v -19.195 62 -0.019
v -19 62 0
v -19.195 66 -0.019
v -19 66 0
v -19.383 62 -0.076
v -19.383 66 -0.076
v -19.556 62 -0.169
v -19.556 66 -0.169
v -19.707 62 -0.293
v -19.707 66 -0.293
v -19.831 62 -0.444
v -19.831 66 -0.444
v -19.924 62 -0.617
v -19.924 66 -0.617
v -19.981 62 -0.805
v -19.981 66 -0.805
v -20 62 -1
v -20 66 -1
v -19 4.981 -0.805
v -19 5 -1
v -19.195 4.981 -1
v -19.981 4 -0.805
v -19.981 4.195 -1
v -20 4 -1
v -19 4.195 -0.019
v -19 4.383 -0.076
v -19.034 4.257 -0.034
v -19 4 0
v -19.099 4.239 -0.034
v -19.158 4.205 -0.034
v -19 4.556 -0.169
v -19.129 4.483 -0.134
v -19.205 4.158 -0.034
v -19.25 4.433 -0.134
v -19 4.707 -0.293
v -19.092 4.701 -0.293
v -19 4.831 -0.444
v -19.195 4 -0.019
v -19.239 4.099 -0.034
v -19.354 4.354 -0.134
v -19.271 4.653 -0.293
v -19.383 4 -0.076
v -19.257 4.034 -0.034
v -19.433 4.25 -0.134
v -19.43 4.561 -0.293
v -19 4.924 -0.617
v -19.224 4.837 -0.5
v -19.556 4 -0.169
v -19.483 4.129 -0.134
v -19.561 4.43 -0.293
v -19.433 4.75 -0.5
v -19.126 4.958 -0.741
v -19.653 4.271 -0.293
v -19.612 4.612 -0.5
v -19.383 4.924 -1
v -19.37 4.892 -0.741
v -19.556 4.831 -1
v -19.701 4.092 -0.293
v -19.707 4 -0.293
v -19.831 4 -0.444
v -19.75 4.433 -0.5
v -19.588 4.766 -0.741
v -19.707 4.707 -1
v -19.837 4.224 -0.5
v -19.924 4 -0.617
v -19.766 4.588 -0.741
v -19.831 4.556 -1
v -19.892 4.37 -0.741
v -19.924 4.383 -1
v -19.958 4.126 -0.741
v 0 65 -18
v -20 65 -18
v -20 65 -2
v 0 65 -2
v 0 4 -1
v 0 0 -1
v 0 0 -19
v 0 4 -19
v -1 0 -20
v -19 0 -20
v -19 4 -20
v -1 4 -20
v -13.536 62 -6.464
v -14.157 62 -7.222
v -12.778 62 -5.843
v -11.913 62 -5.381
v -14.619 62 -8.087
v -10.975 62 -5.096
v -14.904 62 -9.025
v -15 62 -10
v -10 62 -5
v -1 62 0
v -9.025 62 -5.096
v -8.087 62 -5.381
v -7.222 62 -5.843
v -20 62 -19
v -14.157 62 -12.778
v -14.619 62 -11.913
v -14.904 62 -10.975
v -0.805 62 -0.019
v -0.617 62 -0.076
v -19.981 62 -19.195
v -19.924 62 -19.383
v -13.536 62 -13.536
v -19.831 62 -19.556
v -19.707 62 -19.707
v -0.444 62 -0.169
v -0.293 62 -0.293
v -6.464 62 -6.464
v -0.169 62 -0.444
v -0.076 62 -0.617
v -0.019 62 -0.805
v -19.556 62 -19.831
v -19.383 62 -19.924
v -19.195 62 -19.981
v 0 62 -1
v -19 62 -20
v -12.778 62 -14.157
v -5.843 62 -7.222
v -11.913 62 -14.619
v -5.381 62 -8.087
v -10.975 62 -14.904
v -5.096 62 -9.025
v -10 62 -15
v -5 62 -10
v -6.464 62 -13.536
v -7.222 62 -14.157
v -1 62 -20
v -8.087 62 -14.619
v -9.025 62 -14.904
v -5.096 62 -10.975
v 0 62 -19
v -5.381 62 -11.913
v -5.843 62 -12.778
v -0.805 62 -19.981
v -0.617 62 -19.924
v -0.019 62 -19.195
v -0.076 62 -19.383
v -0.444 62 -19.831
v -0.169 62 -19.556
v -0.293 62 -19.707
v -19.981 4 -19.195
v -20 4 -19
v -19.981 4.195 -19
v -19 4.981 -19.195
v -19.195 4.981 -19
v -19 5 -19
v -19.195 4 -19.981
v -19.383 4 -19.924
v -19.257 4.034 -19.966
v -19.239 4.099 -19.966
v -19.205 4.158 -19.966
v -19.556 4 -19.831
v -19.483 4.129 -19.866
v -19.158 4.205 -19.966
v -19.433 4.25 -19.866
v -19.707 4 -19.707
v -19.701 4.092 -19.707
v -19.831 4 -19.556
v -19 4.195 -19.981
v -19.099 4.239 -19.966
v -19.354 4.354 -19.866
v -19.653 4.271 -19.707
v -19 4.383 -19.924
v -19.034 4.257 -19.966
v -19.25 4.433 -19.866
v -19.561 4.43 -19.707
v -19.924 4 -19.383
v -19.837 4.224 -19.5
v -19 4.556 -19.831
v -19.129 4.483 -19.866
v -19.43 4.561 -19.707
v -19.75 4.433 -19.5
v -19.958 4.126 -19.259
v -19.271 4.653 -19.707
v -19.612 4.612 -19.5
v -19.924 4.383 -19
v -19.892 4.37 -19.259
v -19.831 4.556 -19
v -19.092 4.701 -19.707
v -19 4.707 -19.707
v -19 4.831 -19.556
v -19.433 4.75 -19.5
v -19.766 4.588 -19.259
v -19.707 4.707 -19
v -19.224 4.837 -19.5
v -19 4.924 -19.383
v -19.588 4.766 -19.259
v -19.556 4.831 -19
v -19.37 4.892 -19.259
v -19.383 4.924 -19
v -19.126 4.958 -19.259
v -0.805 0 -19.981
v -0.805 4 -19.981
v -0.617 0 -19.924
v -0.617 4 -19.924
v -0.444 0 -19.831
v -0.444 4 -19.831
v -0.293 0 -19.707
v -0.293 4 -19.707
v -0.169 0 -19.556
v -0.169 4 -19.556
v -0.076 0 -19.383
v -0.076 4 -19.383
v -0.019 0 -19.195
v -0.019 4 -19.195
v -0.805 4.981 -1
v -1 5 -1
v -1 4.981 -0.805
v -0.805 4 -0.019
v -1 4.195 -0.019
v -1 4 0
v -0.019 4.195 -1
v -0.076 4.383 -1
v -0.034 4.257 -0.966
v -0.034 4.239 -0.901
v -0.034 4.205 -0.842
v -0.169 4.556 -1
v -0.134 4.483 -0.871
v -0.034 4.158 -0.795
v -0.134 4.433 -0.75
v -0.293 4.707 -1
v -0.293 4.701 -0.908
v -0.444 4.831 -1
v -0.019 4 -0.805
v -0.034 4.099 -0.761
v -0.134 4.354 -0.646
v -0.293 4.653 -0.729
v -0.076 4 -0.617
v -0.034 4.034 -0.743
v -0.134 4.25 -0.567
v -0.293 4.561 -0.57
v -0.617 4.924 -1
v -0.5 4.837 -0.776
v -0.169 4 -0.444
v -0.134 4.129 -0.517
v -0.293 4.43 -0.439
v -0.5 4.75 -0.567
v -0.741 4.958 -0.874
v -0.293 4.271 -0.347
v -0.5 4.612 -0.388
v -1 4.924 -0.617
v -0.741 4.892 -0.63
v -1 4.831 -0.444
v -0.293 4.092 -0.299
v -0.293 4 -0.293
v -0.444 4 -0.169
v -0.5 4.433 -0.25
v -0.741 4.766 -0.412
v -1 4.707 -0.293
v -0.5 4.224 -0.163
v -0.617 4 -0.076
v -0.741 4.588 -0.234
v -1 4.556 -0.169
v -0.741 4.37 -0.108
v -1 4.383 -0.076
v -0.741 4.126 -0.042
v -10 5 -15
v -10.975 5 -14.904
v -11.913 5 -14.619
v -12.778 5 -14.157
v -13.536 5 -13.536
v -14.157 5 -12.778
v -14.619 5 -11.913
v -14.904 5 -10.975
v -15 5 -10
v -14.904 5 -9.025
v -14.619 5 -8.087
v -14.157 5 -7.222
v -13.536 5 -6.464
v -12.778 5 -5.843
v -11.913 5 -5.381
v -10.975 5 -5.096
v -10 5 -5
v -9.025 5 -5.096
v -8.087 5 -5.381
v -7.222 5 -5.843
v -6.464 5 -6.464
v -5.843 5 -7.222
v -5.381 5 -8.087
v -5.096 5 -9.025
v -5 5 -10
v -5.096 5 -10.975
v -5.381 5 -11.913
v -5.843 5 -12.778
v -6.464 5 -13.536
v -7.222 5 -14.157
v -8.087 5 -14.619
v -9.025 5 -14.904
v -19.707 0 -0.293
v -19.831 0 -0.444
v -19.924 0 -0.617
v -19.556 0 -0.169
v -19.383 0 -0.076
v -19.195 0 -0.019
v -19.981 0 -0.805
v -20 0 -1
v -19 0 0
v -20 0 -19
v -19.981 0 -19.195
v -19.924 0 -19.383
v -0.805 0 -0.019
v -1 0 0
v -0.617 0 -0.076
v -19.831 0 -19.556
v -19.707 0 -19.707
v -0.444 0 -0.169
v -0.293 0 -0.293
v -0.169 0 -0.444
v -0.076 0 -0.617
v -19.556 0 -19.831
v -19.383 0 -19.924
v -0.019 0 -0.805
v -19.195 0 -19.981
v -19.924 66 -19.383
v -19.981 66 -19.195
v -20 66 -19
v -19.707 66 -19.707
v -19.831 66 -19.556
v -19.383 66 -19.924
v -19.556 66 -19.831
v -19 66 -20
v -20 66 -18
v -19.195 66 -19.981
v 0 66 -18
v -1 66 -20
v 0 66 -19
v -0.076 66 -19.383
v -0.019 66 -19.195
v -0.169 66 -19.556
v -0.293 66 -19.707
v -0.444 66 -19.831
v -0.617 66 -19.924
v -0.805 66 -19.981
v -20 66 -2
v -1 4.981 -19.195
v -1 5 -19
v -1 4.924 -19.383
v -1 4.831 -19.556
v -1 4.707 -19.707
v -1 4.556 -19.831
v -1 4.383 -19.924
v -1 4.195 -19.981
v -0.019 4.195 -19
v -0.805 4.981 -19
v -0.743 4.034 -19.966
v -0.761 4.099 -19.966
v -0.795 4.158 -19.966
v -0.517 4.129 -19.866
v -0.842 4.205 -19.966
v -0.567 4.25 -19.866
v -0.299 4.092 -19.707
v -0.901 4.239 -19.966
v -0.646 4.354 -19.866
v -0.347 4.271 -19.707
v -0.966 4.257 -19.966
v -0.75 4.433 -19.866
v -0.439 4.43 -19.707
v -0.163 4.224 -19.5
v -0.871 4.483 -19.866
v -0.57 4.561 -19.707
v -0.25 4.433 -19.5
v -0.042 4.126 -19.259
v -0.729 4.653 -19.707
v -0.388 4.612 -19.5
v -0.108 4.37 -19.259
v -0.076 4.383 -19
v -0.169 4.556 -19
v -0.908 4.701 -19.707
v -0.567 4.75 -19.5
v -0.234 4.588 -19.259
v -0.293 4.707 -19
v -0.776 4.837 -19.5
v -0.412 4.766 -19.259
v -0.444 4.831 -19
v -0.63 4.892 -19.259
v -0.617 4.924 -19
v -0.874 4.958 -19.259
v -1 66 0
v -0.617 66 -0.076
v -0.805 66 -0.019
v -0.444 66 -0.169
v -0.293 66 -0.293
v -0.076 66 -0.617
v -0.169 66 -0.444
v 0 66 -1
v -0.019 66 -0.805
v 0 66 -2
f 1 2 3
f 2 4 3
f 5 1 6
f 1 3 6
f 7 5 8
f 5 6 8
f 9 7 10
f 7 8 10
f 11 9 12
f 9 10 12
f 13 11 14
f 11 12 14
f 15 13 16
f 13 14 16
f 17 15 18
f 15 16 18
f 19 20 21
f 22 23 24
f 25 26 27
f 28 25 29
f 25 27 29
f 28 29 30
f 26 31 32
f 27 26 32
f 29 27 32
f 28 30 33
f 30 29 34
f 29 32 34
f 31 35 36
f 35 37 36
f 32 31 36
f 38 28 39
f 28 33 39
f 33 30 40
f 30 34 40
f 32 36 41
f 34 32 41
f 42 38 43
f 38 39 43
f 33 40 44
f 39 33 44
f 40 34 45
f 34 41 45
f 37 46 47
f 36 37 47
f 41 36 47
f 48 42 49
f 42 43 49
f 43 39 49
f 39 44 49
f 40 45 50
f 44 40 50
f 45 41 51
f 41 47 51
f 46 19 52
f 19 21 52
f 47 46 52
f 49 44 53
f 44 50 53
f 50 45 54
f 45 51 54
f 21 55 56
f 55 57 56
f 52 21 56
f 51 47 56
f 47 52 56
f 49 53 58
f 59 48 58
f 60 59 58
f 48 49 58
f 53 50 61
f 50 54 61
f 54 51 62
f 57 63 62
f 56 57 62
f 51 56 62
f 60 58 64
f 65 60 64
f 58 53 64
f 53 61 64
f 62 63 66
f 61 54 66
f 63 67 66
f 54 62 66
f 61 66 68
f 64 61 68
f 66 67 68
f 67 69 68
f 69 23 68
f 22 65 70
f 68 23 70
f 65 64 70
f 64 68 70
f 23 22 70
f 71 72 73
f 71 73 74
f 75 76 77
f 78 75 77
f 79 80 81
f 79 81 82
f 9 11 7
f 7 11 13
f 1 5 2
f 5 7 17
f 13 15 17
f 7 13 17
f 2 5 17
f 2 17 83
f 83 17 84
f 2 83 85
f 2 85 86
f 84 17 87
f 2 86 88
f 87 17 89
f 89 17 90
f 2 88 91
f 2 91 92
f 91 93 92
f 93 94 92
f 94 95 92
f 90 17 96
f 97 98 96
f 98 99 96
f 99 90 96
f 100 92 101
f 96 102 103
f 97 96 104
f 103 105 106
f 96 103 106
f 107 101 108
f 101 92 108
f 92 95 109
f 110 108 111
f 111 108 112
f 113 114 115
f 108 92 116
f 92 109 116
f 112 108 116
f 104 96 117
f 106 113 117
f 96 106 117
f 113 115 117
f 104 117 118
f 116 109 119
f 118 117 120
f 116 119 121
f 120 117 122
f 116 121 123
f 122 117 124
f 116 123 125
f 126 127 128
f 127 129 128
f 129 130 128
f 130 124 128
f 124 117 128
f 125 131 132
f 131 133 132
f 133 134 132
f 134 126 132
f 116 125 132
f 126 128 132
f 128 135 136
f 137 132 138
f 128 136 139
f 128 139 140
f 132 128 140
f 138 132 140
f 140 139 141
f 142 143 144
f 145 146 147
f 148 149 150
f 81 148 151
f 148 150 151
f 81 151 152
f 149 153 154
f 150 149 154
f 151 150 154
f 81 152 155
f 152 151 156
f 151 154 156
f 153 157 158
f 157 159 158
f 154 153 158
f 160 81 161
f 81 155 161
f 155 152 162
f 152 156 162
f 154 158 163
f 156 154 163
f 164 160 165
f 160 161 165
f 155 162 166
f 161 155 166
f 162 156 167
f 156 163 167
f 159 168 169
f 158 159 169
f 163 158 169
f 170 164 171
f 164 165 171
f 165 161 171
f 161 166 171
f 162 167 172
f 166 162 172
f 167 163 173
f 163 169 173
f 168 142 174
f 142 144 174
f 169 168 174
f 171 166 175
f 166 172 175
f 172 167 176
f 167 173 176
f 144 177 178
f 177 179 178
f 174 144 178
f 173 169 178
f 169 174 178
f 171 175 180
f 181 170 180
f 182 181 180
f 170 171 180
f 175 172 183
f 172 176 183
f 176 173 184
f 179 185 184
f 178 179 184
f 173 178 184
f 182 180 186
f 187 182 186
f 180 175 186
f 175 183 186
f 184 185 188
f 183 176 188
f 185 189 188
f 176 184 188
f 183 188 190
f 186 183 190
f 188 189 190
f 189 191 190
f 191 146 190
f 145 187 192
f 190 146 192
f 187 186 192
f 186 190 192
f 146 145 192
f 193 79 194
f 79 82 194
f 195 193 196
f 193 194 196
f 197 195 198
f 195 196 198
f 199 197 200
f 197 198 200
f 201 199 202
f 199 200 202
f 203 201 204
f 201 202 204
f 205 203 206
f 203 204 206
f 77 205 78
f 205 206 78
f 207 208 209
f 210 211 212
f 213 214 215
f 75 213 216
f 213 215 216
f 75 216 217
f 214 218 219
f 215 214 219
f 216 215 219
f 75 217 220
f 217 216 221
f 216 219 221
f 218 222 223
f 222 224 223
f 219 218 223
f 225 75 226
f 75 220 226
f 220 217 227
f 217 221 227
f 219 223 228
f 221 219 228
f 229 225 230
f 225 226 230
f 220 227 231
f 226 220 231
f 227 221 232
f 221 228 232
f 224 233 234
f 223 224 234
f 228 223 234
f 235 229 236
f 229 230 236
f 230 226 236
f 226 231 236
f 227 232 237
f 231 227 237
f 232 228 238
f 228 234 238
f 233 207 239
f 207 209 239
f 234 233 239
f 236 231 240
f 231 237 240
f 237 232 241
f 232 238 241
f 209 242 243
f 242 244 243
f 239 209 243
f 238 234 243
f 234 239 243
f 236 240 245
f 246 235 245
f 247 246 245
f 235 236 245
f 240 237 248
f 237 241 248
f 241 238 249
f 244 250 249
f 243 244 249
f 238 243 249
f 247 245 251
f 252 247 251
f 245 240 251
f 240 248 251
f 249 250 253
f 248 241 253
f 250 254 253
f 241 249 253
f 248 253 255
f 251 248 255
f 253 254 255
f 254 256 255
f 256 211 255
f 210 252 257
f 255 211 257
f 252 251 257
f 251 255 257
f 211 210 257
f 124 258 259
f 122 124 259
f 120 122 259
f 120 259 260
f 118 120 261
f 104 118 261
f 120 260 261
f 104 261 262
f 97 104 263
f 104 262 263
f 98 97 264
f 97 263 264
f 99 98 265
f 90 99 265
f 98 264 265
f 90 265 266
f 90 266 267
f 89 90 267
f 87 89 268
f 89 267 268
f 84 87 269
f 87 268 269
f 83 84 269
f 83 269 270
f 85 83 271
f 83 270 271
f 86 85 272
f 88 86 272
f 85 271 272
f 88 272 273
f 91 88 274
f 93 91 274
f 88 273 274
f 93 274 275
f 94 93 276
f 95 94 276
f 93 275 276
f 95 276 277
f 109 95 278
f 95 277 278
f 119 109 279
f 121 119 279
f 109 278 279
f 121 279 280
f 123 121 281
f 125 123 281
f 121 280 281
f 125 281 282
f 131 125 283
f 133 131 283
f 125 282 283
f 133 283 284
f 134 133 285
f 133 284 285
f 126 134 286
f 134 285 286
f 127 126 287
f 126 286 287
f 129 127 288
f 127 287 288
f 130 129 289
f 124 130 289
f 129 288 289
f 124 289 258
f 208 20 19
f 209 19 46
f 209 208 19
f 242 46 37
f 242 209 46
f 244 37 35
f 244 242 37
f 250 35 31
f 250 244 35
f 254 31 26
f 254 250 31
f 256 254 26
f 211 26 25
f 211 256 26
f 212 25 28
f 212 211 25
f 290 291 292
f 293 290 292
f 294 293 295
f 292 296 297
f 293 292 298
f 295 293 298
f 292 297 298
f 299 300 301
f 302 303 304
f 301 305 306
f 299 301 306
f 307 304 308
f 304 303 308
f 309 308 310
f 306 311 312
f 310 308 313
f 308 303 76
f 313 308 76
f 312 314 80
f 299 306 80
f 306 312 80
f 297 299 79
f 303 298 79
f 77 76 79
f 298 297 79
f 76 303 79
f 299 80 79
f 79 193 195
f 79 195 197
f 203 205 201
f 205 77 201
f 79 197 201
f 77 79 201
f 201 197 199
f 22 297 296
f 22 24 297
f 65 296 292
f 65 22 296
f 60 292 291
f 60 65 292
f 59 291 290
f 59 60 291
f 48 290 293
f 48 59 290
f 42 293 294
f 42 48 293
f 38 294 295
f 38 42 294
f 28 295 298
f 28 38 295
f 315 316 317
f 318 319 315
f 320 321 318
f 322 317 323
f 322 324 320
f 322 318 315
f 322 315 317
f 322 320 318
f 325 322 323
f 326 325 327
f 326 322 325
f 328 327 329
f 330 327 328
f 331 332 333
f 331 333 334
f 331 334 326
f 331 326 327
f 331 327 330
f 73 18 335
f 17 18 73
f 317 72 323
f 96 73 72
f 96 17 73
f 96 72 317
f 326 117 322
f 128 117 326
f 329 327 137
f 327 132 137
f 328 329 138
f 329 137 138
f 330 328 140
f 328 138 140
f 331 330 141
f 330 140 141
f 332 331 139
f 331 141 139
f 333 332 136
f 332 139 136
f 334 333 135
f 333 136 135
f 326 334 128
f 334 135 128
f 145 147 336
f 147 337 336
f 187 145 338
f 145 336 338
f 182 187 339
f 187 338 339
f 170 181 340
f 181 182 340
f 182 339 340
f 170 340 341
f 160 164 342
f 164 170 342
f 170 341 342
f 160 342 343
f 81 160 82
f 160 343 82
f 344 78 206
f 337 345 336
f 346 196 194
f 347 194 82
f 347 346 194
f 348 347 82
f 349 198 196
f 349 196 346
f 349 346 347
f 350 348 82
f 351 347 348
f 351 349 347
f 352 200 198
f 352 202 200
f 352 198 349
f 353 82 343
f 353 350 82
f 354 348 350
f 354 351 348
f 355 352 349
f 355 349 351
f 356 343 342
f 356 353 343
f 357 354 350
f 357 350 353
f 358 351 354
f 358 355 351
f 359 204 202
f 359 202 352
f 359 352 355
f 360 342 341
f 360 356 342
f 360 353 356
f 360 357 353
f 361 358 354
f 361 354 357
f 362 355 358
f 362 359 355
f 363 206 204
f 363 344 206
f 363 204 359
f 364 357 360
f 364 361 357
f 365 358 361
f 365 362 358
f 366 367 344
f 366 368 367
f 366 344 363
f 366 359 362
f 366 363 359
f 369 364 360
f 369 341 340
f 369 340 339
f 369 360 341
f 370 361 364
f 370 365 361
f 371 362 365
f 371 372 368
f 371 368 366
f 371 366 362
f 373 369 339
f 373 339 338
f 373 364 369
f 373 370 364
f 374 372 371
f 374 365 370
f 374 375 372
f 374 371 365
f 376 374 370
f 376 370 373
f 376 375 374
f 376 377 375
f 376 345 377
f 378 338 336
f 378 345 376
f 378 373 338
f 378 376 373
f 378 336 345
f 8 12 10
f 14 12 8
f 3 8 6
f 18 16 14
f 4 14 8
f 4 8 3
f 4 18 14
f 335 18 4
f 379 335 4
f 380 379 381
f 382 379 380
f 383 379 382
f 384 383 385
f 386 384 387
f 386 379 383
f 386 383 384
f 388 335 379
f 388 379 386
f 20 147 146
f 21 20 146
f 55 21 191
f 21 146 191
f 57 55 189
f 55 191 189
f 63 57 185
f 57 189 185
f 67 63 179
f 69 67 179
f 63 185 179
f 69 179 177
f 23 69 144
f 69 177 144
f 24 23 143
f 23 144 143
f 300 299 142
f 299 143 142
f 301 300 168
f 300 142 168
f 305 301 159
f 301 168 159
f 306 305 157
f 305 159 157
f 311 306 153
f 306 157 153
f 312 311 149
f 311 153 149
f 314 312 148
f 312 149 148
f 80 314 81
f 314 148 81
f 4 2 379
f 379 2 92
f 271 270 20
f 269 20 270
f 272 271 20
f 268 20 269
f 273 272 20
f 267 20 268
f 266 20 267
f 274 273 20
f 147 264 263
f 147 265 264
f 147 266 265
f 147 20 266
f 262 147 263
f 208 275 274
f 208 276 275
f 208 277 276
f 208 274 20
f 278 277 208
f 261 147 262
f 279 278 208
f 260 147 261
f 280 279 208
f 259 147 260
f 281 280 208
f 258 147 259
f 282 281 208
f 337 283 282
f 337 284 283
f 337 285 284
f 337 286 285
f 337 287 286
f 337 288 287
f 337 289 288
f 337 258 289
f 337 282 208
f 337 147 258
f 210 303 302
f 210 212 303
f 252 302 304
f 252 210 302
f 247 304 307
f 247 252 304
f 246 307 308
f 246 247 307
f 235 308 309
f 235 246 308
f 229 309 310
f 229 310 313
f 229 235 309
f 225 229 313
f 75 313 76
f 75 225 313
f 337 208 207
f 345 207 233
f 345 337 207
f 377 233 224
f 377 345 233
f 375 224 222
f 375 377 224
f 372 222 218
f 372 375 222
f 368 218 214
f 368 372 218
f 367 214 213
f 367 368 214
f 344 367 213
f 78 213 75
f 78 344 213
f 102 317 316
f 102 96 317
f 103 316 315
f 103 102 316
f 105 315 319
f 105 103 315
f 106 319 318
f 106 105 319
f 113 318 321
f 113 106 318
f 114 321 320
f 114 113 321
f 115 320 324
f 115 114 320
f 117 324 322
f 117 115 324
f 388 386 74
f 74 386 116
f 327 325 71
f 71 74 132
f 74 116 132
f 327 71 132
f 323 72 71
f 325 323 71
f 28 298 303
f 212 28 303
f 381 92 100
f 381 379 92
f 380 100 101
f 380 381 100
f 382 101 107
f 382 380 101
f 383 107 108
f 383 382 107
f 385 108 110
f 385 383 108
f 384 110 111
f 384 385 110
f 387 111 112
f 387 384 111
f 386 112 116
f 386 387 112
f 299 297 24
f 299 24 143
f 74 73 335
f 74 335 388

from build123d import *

# Parameters (mm, degrees)
SKETCH_1_W      = 20
SKETCH_1_H      = 20
EXTRUDE_1_DEPTH = 5
SKETCH_2_R      = 5
EXTRUDE_2_DEPTH = 57
SKETCH_4_W      = 20
SKETCH_4_H      = 20
EXTRUDE_3_DEPTH = 3
SKETCH_5_W      = 20
SKETCH_5_H      = 2
EXTRUDE_4_DEPTH = 1
SKETCH_6_W      = 20
SKETCH_6_H      = 2
EXTRUDE_5_DEPTH = 1
FILLET_1_R      = 1
FILLET_2_R      = 1
FILLET_3_R      = 1


with BuildPart() as part:
    # 草图1 → 凸台-拉伸1 (new body)
    with BuildSketch(Plane(origin=(0, 0, 0), x_dir=(1, 0, 0), z_dir=(0, 1, 0))):
        with Locations((-10, 10)):
            Rectangle(SKETCH_1_W, SKETCH_1_H)
    extrude(amount=EXTRUDE_1_DEPTH)

    # 草图2 → 凸台-拉伸2 (add)
    with BuildSketch(Plane(origin=(0, 5, 0), x_dir=(1, 0, 0), z_dir=(0, 1, 0))):
        with Locations(Location((-10, 10, 0), (0, 0, 90))):
            Circle(SKETCH_2_R)
    extrude(amount=EXTRUDE_2_DEPTH)

    # 草图4 → 凸台-拉伸3 (add)
    with BuildSketch(Plane(origin=(0, 62, 0), x_dir=(1, 0, 0), z_dir=(0, 1, 0))):
        with Locations((-10, 10)):
            Rectangle(SKETCH_4_W, SKETCH_4_H)
    extrude(amount=EXTRUDE_3_DEPTH)

    # 草图5 → 凸台-拉伸4 (add)
    with BuildSketch(Plane(origin=(0, 65, 0), x_dir=(1, 0, 0), z_dir=(0, 1, 0))):
        with Locations((-10, 19)):
            Rectangle(SKETCH_5_W, SKETCH_5_H)
    extrude(amount=EXTRUDE_4_DEPTH)

    # 草图6 → 凸台-拉伸5 (add)
    with BuildSketch(Plane(origin=(0, 65, 0), x_dir=(1, 0, 0), z_dir=(0, 1, 0))):
        with Locations((-10, 1)):
            Rectangle(SKETCH_6_W, SKETCH_6_H)
    extrude(amount=EXTRUDE_5_DEPTH)

    # 圆角1
    fillet_1_edges = [part.edges().sort_by_distance(p)[0] for p in [
        (0, 64, 0),
    ]]
    fillet(fillet_1_edges, radius=FILLET_1_R)

    # 圆角2
    fillet_2_edges = [part.edges().sort_by_distance(p)[0] for p in [
        (-20, 64, -20),
        (-20, 64, 0),
        (0, 64, -20),
    ]]
    fillet(fillet_2_edges, radius=FILLET_2_R)

    # 圆角3
    fillet_3_edges = [part.edges().sort_by_distance(p)[0] for p in [
        (-20, 5, -10),
        (-10, 5, 0),
        (0, 5, -10),
        (0, 2.5, 0),
        (-20, 2.5, 0),
        (-20, 2.5, -20),
        (0, 2.5, -20),
        (-10, 5, -20),
    ]]
    fillet(fillet_3_edges, radius=FILLET_3_R)


solid = part.part
